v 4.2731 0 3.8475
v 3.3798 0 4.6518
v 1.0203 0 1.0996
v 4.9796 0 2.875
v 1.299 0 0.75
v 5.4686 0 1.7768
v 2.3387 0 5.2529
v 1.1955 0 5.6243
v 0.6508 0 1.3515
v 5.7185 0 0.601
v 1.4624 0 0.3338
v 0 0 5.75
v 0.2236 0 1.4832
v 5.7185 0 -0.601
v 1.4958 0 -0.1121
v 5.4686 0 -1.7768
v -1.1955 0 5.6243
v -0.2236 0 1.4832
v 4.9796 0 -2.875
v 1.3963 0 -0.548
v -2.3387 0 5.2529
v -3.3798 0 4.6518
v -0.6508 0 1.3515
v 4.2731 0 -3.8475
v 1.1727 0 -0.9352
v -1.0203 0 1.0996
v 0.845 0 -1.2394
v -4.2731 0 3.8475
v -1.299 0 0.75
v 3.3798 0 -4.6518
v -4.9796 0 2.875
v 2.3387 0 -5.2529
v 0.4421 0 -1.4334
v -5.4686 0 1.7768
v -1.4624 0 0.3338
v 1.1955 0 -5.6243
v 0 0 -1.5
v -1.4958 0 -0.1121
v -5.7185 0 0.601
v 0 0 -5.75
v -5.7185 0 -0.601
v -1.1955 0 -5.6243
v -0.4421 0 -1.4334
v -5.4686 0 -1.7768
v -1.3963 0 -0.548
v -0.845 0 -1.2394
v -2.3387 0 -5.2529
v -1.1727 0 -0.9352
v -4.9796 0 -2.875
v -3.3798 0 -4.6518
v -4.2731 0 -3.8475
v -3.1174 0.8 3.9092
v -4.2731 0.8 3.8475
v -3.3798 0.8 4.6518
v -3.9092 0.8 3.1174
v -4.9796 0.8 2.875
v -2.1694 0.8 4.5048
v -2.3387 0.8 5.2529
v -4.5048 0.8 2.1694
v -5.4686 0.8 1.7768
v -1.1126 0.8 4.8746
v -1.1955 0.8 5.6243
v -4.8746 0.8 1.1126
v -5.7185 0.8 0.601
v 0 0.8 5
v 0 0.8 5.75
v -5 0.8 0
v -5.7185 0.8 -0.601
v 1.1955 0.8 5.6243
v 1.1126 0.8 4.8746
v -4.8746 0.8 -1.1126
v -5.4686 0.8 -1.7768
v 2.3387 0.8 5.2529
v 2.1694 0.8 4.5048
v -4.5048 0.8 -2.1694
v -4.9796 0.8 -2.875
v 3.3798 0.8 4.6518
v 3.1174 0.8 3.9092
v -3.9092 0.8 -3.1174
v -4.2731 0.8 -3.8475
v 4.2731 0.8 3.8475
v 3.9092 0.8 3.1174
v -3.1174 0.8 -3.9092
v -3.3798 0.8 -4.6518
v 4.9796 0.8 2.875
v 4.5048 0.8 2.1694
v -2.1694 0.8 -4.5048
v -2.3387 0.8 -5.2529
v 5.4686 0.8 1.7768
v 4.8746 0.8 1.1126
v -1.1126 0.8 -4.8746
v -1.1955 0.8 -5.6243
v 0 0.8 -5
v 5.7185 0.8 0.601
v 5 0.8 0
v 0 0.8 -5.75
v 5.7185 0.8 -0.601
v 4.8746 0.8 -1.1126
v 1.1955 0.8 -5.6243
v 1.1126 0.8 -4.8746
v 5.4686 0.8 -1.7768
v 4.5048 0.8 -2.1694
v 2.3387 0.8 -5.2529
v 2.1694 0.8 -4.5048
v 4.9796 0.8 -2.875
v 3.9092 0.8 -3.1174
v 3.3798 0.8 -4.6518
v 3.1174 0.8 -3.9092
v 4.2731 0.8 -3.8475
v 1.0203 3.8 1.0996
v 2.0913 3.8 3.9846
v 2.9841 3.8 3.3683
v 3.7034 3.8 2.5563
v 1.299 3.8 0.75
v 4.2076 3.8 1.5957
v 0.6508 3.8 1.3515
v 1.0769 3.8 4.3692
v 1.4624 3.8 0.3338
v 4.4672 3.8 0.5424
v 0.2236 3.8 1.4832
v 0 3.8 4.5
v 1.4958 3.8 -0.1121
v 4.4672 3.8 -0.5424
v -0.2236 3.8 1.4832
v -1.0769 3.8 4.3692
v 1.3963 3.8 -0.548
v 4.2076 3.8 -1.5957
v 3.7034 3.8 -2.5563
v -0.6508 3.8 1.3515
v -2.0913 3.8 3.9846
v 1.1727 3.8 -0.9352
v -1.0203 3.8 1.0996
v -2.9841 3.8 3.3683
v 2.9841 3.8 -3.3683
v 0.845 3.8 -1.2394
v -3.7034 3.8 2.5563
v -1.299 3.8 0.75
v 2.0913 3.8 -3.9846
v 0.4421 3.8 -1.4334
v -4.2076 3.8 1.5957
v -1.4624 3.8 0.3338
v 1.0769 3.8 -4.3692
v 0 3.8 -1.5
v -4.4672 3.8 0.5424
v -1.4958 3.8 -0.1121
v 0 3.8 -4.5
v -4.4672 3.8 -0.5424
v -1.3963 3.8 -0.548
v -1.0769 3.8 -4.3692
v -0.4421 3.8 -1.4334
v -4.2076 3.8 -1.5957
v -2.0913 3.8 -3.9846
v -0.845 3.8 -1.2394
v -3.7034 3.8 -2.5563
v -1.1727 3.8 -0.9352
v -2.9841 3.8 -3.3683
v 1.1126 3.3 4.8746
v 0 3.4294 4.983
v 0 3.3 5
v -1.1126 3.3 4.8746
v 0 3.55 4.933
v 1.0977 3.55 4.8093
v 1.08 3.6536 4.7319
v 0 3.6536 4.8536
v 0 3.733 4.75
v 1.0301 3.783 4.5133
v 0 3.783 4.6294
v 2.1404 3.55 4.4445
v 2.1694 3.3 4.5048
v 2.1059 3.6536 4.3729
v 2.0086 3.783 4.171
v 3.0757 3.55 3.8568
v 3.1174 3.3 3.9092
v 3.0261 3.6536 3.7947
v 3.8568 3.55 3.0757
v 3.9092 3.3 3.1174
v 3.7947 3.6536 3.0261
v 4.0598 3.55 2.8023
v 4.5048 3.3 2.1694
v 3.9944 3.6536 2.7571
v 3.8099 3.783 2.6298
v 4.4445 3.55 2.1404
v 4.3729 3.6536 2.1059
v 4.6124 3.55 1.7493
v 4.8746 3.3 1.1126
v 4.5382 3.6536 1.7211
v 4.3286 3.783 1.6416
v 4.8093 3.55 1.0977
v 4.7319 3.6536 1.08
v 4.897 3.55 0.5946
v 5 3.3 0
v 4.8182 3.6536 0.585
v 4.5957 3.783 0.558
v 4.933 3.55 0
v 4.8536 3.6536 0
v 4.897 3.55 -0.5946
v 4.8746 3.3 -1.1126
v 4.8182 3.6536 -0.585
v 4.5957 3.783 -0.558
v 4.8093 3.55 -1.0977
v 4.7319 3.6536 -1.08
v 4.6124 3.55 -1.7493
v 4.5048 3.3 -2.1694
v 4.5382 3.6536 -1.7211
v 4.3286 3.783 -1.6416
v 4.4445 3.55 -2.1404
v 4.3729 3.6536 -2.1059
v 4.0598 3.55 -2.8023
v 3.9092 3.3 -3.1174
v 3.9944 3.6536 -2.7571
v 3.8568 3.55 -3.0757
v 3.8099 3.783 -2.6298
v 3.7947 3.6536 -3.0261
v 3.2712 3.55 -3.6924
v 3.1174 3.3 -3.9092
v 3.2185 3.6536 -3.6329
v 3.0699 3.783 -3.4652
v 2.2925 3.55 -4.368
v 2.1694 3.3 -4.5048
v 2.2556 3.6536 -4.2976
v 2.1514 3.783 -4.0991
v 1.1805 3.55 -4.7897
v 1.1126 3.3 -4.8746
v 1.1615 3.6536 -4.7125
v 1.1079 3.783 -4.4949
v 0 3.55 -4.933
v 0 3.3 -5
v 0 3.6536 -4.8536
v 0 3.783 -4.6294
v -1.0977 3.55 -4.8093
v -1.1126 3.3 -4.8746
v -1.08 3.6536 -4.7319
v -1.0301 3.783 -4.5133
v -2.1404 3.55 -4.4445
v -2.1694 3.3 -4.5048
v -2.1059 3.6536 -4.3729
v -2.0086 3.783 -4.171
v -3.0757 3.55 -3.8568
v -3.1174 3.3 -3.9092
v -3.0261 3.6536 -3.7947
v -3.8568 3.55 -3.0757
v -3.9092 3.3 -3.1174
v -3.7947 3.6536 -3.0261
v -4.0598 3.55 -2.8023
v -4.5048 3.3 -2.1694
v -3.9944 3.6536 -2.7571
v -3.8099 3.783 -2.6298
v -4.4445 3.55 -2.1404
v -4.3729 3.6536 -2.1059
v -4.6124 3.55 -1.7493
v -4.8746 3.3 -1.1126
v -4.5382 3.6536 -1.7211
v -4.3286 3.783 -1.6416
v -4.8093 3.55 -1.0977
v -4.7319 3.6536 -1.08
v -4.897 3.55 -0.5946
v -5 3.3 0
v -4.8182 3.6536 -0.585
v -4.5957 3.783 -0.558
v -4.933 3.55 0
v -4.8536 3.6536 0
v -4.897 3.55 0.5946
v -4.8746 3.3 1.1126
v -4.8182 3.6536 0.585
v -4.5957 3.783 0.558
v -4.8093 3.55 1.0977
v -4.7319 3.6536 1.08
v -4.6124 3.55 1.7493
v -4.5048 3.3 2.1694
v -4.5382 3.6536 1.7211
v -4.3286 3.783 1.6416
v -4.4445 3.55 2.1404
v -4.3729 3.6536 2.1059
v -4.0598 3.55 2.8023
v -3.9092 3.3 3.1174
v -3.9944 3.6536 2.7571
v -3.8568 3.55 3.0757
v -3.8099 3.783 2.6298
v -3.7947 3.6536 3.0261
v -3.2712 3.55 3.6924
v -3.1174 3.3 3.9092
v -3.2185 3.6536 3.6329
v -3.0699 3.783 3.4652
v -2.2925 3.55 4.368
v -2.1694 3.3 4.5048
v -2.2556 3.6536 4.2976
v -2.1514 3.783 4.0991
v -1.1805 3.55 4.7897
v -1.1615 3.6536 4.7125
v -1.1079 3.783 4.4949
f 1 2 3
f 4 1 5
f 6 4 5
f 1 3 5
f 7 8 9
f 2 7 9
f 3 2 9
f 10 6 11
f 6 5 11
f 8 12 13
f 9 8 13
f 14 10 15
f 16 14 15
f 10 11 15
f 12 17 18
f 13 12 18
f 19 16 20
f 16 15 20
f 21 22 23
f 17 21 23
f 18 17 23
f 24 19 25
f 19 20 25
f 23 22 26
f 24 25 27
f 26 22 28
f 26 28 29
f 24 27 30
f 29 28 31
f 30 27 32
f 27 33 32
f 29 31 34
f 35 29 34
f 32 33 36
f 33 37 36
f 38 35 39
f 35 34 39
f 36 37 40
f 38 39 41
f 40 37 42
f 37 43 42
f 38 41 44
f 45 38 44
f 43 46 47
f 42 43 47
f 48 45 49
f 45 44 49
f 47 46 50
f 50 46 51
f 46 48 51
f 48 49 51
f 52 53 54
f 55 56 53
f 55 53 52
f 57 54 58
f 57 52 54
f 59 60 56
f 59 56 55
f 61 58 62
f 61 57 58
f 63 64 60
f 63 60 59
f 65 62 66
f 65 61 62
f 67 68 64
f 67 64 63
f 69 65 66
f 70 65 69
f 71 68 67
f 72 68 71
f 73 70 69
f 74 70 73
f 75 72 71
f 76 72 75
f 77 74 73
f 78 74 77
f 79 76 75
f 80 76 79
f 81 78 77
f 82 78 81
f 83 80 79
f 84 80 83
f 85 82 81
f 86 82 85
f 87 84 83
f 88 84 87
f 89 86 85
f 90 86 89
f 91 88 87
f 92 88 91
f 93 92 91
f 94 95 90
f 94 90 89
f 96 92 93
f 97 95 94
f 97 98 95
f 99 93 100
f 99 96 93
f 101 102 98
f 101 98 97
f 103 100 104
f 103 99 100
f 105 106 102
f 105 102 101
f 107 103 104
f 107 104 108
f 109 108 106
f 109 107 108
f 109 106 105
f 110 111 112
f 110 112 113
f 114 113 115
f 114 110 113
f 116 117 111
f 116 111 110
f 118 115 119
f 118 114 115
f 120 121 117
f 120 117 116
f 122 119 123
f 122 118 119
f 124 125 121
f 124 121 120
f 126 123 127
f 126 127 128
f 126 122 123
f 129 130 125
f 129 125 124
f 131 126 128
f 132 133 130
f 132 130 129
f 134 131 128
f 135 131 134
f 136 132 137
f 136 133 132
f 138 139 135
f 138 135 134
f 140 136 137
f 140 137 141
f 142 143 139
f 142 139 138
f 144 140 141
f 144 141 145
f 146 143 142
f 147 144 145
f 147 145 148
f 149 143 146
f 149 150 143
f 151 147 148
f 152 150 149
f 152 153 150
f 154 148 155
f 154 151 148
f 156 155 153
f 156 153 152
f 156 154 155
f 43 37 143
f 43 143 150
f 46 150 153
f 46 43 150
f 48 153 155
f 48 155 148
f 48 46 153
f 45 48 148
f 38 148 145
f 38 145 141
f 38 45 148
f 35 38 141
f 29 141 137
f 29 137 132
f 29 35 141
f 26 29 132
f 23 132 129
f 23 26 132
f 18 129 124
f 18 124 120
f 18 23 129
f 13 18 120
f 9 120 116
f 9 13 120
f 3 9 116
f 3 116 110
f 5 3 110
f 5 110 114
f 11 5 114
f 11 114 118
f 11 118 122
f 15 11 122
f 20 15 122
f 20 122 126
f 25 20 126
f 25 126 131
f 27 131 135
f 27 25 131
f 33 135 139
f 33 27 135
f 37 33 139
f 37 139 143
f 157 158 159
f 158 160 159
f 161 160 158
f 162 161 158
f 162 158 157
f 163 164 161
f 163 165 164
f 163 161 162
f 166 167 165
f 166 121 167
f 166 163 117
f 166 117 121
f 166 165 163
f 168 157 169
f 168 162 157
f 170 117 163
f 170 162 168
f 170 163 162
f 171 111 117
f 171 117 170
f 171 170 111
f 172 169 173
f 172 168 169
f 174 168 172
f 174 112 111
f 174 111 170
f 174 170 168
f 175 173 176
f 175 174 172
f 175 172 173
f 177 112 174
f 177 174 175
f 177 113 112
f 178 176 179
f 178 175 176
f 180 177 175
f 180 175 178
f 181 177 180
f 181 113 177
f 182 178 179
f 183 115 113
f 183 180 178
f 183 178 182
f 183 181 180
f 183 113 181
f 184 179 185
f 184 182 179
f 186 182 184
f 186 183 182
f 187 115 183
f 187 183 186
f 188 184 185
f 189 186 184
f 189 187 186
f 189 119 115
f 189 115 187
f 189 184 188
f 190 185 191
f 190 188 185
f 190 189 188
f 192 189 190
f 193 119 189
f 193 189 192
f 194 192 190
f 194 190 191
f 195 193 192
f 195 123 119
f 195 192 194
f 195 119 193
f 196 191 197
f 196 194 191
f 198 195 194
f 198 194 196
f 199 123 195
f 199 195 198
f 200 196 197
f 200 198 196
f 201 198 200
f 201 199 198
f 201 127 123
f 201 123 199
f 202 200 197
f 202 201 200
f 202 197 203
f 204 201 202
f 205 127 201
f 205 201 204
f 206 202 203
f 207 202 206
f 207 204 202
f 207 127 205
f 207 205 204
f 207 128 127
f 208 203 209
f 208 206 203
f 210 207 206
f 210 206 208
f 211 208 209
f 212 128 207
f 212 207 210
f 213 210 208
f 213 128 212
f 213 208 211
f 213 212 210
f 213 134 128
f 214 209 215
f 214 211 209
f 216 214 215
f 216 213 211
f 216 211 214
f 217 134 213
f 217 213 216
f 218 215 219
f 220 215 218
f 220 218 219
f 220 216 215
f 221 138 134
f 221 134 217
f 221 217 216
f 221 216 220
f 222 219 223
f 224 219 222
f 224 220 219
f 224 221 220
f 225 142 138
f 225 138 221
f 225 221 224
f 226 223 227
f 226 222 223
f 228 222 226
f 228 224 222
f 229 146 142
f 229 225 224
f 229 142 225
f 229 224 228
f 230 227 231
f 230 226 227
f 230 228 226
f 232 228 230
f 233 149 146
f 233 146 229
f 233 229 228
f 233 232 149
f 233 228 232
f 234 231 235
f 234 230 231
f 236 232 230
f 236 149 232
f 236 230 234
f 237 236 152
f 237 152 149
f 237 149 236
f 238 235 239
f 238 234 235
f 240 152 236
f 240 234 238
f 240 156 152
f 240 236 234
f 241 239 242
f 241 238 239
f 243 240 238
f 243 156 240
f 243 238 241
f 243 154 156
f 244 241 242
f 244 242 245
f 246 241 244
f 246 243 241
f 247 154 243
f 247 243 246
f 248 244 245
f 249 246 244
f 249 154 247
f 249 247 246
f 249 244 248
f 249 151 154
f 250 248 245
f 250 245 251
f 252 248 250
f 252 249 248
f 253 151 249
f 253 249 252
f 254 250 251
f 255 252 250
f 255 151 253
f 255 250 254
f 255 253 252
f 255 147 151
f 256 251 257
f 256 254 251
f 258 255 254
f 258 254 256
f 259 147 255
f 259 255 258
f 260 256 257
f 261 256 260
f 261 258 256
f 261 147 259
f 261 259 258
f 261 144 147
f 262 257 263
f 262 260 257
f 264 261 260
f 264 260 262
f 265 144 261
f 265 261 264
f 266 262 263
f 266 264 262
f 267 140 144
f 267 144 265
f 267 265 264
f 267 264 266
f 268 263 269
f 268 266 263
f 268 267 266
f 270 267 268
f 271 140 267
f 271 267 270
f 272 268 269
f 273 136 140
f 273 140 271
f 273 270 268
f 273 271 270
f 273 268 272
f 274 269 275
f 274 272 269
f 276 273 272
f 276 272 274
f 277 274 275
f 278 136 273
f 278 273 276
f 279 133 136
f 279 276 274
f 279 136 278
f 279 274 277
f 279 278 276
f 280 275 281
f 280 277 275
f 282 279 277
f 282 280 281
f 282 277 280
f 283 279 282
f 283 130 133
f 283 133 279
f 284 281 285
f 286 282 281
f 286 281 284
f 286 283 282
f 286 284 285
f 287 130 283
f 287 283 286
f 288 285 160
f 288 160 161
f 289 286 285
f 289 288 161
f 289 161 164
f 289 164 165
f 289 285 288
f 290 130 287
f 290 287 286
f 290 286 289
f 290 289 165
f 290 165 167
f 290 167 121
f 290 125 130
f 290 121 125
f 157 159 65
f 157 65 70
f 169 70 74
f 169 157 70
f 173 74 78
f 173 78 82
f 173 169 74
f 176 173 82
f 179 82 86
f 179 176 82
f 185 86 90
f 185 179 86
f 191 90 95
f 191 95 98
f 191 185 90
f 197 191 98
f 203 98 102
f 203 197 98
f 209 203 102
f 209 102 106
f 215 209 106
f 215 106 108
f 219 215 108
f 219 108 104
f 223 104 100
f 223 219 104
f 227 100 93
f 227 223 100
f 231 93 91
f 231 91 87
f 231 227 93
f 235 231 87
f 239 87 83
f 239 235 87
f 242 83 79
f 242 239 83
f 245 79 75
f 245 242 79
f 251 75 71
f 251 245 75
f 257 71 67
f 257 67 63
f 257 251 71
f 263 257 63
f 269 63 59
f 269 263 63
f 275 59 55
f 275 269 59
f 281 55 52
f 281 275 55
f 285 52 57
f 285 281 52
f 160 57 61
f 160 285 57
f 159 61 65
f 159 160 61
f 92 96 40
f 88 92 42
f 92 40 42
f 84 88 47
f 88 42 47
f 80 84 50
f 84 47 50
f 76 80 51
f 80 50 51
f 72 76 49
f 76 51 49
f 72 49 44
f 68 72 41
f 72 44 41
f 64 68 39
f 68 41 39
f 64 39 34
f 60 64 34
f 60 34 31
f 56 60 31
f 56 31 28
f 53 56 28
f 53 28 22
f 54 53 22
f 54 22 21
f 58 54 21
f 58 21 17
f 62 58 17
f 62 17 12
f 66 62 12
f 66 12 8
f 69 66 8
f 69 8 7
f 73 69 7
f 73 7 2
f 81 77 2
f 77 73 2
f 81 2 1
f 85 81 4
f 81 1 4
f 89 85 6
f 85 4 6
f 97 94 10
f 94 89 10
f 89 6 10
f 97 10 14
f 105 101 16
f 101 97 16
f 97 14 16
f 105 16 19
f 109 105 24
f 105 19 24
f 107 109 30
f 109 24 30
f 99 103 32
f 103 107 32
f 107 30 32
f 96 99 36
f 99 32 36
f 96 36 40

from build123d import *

# Parameters (mm, degrees)
SKETCH1_R           = 5.75
SKETCH1_R_2         = 1.5
BOSS_EXTRUDE1_DEPTH = 3.8
SKETCH2_OUTSIDE_W   = 16.84
SKETCH2_OUTSIDE_H   = 16.84
SKETCH2_OUTSIDE_R   = 5
CUT_EXTRUDE1_DEPTH  = 3
FILLET1_R           = 0.5


with BuildPart() as part:
    # Sketch1 → Boss-Extrude1 (new body)
    with BuildSketch(Plane(origin=(0, 0, 0), x_dir=(1, 0, 0), z_dir=(0, 1, 0))):
        with Locations(Location((0, 0, 0), (0, 0, 90))):
            Circle(SKETCH1_R)
        with Locations(Location((0, 0, 0), (0, 0, 90))):
            Circle(SKETCH1_R_2, mode=Mode.SUBTRACT)
    extrude(amount=BOSS_EXTRUDE1_DEPTH)

    # Sketch2 outside → Cut-Extrude1 (cut)
    with BuildSketch(Plane(origin=(0, 3.8, 0), x_dir=(1, 0, 0), z_dir=(0, 1, 0))):
        Rectangle(SKETCH2_OUTSIDE_W, SKETCH2_OUTSIDE_H)
        with Locations(Location((0, 0, 0), (0, 0, 270))):
            Circle(SKETCH2_OUTSIDE_R, mode=Mode.SUBTRACT)
    extrude(amount=-CUT_EXTRUDE1_DEPTH, mode=Mode.SUBTRACT)

    # Fillet1
    fillet1_edges = [part.edges().sort_by_distance(p)[0] for p in [
        (0, 3.8, -5),
    ]]
    fillet(fillet1_edges, radius=FILLET1_R)


solid = part.part
